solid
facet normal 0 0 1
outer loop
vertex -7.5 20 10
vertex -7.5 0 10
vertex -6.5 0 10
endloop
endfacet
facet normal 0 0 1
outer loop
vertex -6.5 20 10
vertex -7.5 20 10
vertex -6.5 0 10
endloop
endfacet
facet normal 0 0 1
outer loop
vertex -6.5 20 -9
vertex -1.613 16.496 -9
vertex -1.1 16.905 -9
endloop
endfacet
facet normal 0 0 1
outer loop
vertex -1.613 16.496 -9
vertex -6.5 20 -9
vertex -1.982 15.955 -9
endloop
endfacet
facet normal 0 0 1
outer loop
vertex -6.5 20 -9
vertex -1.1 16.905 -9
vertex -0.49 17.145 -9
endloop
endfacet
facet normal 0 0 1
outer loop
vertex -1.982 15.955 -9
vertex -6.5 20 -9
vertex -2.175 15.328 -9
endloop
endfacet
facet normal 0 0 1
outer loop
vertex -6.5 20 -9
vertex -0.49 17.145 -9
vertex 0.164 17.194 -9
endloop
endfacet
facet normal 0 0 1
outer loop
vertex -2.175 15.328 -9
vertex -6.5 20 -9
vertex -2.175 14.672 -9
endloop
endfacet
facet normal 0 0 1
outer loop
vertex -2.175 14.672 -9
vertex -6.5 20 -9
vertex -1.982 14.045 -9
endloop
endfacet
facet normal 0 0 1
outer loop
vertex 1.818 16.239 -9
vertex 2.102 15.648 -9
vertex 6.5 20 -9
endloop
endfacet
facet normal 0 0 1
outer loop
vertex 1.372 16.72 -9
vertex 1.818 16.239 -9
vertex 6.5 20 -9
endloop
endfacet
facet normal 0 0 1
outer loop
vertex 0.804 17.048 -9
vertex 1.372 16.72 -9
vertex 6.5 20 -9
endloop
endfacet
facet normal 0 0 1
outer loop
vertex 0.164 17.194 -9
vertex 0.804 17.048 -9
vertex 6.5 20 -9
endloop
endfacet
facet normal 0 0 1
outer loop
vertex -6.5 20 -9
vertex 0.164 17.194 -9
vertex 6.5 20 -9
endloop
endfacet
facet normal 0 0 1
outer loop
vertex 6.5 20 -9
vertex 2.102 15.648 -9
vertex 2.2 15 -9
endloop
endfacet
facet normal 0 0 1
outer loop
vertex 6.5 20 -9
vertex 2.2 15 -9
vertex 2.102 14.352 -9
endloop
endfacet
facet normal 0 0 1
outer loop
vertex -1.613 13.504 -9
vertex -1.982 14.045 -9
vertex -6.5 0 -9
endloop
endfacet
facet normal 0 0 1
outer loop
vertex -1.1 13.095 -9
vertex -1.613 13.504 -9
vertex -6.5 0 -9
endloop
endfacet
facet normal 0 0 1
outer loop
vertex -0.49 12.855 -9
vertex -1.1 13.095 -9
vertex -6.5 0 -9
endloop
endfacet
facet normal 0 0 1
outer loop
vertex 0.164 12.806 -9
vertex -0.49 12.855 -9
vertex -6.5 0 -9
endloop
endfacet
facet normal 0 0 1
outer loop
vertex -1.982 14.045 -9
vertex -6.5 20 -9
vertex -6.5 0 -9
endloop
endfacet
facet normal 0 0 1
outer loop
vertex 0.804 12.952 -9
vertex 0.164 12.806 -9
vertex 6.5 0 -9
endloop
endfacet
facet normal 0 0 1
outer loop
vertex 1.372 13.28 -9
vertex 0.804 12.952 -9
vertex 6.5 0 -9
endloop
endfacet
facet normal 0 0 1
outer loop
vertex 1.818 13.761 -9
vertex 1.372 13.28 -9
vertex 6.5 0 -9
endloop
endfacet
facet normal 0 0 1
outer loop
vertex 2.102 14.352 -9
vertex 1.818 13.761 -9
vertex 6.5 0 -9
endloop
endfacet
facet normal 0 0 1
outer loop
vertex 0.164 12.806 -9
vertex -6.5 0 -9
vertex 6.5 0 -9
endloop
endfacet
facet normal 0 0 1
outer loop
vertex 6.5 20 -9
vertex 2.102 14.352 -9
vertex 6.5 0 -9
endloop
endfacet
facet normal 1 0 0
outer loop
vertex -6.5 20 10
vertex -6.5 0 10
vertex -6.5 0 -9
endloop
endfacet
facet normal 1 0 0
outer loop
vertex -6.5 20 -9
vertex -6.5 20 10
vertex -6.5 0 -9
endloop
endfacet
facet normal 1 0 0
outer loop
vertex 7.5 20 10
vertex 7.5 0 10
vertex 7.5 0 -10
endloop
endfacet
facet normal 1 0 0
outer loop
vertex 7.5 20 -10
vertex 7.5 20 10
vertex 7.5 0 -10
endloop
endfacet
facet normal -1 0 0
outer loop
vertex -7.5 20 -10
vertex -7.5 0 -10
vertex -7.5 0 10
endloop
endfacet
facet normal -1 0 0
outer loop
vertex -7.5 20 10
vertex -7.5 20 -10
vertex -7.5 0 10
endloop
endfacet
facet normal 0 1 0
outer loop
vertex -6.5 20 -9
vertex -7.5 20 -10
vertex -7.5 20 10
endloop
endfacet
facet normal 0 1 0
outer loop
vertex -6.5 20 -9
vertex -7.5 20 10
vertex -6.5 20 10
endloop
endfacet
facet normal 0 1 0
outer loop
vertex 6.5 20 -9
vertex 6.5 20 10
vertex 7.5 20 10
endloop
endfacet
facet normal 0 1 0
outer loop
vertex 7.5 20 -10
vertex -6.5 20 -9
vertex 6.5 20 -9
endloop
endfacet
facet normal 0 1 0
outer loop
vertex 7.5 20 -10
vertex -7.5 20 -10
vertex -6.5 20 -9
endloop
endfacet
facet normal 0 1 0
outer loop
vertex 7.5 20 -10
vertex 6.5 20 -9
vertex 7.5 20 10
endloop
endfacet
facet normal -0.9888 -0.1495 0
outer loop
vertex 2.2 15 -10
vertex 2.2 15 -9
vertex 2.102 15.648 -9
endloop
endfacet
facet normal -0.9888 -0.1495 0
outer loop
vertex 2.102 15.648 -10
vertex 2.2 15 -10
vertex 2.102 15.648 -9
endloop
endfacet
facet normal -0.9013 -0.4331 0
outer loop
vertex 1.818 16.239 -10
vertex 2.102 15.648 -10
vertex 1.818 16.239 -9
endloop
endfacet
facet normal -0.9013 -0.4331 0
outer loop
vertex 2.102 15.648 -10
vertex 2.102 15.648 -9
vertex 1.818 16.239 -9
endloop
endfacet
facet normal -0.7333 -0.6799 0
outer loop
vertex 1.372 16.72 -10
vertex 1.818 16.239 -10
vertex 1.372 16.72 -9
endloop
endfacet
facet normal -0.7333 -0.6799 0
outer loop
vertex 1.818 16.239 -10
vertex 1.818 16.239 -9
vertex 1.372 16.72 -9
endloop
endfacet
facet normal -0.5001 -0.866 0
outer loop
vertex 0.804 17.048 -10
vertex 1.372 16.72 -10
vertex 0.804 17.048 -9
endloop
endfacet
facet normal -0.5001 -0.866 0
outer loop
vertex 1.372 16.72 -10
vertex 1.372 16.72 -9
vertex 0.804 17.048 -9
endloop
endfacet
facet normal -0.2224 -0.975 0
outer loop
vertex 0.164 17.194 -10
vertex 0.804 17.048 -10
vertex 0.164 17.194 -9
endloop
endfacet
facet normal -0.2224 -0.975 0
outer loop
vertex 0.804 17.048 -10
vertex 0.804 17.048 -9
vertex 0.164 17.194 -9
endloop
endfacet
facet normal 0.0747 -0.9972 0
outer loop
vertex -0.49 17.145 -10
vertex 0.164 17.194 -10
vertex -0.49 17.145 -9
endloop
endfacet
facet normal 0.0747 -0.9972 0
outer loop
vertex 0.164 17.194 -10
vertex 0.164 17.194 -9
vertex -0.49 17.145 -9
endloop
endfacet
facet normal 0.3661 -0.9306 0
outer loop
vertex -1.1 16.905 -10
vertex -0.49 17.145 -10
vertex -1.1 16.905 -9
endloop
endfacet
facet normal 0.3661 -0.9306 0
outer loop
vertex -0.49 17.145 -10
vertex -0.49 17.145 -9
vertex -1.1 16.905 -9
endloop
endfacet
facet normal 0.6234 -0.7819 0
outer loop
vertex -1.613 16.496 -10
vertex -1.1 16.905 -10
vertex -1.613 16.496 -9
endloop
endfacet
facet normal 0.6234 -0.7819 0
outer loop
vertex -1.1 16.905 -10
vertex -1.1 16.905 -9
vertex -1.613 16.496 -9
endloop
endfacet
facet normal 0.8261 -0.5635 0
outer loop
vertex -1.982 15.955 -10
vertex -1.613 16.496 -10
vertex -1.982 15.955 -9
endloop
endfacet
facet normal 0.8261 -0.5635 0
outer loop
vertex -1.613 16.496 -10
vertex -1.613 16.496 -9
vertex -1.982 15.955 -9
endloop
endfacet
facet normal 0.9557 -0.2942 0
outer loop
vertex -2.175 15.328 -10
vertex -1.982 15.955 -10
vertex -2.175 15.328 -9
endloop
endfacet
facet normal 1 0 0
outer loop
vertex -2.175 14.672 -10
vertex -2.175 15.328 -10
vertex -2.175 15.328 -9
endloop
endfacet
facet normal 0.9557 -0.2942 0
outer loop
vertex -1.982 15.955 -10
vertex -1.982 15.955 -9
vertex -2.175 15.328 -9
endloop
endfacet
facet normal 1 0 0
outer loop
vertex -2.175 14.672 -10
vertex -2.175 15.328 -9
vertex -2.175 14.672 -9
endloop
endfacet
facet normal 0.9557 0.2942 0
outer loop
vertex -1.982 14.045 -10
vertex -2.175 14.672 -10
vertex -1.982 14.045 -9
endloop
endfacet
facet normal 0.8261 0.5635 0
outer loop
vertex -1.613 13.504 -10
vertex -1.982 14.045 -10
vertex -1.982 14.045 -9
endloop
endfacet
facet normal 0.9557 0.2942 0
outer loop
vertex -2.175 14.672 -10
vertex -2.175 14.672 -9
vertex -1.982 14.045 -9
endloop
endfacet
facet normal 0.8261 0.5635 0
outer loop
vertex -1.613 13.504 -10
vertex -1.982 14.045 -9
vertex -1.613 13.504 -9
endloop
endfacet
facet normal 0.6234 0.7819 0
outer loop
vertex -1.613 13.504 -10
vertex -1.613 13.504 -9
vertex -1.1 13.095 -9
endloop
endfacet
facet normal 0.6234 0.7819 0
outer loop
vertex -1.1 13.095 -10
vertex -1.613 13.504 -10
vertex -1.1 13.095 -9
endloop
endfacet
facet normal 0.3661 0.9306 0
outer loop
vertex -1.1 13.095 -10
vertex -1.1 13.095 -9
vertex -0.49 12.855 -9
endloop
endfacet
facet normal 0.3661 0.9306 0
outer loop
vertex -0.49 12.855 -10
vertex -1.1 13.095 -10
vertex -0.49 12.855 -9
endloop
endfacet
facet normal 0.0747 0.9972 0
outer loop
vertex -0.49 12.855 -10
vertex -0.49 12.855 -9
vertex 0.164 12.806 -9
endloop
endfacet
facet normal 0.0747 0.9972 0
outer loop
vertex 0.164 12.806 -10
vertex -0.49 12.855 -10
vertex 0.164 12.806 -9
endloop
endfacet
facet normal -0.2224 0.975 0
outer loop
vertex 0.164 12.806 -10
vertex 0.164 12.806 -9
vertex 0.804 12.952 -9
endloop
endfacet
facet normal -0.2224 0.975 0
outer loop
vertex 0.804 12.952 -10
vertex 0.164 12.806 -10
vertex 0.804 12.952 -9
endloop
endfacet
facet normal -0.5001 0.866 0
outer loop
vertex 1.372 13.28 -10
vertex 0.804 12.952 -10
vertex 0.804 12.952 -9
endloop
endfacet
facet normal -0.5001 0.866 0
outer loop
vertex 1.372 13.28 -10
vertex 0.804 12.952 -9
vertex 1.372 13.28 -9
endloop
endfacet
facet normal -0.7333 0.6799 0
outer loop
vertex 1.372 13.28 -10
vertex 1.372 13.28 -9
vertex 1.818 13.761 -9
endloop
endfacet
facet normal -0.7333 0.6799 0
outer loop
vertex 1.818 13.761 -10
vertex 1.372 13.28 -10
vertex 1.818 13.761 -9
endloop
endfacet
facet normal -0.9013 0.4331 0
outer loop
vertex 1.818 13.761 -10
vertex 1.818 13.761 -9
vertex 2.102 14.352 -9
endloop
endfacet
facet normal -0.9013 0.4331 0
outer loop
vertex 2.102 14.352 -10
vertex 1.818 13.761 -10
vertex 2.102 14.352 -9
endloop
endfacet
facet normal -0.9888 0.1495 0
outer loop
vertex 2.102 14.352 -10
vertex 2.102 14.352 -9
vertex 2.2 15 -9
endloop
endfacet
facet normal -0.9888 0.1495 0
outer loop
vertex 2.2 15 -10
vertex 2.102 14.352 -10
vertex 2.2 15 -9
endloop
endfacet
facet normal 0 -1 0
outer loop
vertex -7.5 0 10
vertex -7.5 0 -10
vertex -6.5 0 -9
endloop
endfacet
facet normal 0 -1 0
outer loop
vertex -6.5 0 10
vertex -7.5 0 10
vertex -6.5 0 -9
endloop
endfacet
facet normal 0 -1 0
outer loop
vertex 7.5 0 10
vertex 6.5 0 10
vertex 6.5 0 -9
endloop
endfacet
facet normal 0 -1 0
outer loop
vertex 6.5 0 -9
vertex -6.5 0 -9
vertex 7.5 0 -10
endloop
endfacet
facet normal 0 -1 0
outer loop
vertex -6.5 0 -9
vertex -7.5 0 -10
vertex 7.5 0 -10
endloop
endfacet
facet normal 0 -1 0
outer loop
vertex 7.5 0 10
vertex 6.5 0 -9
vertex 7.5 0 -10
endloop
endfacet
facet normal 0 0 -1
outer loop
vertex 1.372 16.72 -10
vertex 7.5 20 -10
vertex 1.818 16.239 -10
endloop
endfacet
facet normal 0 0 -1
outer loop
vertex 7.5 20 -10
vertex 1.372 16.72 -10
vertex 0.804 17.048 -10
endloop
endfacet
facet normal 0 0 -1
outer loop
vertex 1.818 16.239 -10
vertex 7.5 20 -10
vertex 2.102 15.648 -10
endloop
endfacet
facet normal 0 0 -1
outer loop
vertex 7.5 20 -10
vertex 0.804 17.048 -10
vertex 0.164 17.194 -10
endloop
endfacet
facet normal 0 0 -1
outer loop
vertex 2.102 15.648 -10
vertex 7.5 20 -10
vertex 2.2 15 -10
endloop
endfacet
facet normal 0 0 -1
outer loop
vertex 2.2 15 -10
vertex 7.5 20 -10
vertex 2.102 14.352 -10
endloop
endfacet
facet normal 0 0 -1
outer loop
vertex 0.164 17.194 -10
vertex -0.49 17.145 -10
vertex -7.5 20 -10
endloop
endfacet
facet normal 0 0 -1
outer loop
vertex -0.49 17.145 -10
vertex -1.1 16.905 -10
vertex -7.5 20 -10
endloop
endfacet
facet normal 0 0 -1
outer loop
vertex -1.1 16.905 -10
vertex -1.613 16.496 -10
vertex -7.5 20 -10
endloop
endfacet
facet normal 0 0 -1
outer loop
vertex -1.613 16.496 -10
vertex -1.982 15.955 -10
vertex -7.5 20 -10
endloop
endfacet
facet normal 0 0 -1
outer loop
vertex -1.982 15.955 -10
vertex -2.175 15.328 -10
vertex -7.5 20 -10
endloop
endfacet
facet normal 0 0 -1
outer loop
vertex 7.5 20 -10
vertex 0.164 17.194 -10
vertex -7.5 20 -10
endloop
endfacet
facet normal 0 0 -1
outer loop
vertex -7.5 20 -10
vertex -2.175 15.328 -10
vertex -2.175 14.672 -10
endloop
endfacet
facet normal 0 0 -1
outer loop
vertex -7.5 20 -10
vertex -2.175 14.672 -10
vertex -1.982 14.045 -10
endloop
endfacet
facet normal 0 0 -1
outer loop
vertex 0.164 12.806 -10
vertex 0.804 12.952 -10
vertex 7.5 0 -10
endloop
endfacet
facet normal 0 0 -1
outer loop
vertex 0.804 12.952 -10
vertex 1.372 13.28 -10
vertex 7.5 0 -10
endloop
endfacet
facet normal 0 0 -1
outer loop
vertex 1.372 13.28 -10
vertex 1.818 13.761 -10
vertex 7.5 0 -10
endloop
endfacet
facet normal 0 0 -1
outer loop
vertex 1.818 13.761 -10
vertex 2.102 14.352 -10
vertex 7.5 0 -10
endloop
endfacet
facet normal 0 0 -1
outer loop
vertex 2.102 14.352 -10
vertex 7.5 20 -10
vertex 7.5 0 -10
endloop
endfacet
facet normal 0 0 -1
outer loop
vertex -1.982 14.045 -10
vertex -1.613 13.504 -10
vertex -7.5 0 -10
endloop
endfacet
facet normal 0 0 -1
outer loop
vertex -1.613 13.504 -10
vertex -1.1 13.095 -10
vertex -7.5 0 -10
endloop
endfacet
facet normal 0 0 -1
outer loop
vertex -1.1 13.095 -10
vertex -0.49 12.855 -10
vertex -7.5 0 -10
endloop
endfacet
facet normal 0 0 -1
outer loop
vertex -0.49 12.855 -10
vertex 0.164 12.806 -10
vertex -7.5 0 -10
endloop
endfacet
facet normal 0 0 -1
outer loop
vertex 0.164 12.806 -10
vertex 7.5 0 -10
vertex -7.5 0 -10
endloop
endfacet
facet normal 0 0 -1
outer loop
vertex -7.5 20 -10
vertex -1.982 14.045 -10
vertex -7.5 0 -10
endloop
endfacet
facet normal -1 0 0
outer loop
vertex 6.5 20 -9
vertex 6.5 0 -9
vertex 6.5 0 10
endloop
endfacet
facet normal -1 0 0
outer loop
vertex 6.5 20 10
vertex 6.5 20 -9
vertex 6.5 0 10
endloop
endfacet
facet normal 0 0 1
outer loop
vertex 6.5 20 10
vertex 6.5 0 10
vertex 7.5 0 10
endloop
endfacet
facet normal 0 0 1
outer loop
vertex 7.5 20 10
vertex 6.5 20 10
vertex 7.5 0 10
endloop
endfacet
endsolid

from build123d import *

# Parameters (mm, degrees)
SALIENTE_EXTRUIR1_DEPTH                             = 20
CBORE_FOR_M2_HEX_SOCKET_HEAD_CAP_SCREW1_D           = 2.4
CBORE_FOR_M2_HEX_SOCKET_HEAD_CAP_SCREW1_CBORE_D     = 4.4
CBORE_FOR_M2_HEX_SOCKET_HEAD_CAP_SCREW1_CBORE_DEPTH = 2.4


with BuildPart() as part:
    # Croquis1 → Saliente-Extruir1 (new body)
    with BuildSketch(Plane(origin=(0, 0, 0), x_dir=(1, 0, 0), z_dir=(0, 1, 0))):
        Polygon((6.5, -10), (7.5, -10), (7.5, 10), (-7.5, 10), (-7.5, -10), (-6.5, -10), (-6.5, 9), (6.5, 9), align=None)
    extrude(amount=SALIENTE_EXTRUIR1_DEPTH)

    # CBORE for M2 Hex Socket Head Cap Screw1 (through all)
    with Locations(Plane.XY.offset(-9)):
        with Locations((0, 15)):
            CounterBoreHole(CBORE_FOR_M2_HEX_SOCKET_HEAD_CAP_SCREW1_D / 2, CBORE_FOR_M2_HEX_SOCKET_HEAD_CAP_SCREW1_CBORE_D / 2, CBORE_FOR_M2_HEX_SOCKET_HEAD_CAP_SCREW1_CBORE_DEPTH)


solid = part.part
